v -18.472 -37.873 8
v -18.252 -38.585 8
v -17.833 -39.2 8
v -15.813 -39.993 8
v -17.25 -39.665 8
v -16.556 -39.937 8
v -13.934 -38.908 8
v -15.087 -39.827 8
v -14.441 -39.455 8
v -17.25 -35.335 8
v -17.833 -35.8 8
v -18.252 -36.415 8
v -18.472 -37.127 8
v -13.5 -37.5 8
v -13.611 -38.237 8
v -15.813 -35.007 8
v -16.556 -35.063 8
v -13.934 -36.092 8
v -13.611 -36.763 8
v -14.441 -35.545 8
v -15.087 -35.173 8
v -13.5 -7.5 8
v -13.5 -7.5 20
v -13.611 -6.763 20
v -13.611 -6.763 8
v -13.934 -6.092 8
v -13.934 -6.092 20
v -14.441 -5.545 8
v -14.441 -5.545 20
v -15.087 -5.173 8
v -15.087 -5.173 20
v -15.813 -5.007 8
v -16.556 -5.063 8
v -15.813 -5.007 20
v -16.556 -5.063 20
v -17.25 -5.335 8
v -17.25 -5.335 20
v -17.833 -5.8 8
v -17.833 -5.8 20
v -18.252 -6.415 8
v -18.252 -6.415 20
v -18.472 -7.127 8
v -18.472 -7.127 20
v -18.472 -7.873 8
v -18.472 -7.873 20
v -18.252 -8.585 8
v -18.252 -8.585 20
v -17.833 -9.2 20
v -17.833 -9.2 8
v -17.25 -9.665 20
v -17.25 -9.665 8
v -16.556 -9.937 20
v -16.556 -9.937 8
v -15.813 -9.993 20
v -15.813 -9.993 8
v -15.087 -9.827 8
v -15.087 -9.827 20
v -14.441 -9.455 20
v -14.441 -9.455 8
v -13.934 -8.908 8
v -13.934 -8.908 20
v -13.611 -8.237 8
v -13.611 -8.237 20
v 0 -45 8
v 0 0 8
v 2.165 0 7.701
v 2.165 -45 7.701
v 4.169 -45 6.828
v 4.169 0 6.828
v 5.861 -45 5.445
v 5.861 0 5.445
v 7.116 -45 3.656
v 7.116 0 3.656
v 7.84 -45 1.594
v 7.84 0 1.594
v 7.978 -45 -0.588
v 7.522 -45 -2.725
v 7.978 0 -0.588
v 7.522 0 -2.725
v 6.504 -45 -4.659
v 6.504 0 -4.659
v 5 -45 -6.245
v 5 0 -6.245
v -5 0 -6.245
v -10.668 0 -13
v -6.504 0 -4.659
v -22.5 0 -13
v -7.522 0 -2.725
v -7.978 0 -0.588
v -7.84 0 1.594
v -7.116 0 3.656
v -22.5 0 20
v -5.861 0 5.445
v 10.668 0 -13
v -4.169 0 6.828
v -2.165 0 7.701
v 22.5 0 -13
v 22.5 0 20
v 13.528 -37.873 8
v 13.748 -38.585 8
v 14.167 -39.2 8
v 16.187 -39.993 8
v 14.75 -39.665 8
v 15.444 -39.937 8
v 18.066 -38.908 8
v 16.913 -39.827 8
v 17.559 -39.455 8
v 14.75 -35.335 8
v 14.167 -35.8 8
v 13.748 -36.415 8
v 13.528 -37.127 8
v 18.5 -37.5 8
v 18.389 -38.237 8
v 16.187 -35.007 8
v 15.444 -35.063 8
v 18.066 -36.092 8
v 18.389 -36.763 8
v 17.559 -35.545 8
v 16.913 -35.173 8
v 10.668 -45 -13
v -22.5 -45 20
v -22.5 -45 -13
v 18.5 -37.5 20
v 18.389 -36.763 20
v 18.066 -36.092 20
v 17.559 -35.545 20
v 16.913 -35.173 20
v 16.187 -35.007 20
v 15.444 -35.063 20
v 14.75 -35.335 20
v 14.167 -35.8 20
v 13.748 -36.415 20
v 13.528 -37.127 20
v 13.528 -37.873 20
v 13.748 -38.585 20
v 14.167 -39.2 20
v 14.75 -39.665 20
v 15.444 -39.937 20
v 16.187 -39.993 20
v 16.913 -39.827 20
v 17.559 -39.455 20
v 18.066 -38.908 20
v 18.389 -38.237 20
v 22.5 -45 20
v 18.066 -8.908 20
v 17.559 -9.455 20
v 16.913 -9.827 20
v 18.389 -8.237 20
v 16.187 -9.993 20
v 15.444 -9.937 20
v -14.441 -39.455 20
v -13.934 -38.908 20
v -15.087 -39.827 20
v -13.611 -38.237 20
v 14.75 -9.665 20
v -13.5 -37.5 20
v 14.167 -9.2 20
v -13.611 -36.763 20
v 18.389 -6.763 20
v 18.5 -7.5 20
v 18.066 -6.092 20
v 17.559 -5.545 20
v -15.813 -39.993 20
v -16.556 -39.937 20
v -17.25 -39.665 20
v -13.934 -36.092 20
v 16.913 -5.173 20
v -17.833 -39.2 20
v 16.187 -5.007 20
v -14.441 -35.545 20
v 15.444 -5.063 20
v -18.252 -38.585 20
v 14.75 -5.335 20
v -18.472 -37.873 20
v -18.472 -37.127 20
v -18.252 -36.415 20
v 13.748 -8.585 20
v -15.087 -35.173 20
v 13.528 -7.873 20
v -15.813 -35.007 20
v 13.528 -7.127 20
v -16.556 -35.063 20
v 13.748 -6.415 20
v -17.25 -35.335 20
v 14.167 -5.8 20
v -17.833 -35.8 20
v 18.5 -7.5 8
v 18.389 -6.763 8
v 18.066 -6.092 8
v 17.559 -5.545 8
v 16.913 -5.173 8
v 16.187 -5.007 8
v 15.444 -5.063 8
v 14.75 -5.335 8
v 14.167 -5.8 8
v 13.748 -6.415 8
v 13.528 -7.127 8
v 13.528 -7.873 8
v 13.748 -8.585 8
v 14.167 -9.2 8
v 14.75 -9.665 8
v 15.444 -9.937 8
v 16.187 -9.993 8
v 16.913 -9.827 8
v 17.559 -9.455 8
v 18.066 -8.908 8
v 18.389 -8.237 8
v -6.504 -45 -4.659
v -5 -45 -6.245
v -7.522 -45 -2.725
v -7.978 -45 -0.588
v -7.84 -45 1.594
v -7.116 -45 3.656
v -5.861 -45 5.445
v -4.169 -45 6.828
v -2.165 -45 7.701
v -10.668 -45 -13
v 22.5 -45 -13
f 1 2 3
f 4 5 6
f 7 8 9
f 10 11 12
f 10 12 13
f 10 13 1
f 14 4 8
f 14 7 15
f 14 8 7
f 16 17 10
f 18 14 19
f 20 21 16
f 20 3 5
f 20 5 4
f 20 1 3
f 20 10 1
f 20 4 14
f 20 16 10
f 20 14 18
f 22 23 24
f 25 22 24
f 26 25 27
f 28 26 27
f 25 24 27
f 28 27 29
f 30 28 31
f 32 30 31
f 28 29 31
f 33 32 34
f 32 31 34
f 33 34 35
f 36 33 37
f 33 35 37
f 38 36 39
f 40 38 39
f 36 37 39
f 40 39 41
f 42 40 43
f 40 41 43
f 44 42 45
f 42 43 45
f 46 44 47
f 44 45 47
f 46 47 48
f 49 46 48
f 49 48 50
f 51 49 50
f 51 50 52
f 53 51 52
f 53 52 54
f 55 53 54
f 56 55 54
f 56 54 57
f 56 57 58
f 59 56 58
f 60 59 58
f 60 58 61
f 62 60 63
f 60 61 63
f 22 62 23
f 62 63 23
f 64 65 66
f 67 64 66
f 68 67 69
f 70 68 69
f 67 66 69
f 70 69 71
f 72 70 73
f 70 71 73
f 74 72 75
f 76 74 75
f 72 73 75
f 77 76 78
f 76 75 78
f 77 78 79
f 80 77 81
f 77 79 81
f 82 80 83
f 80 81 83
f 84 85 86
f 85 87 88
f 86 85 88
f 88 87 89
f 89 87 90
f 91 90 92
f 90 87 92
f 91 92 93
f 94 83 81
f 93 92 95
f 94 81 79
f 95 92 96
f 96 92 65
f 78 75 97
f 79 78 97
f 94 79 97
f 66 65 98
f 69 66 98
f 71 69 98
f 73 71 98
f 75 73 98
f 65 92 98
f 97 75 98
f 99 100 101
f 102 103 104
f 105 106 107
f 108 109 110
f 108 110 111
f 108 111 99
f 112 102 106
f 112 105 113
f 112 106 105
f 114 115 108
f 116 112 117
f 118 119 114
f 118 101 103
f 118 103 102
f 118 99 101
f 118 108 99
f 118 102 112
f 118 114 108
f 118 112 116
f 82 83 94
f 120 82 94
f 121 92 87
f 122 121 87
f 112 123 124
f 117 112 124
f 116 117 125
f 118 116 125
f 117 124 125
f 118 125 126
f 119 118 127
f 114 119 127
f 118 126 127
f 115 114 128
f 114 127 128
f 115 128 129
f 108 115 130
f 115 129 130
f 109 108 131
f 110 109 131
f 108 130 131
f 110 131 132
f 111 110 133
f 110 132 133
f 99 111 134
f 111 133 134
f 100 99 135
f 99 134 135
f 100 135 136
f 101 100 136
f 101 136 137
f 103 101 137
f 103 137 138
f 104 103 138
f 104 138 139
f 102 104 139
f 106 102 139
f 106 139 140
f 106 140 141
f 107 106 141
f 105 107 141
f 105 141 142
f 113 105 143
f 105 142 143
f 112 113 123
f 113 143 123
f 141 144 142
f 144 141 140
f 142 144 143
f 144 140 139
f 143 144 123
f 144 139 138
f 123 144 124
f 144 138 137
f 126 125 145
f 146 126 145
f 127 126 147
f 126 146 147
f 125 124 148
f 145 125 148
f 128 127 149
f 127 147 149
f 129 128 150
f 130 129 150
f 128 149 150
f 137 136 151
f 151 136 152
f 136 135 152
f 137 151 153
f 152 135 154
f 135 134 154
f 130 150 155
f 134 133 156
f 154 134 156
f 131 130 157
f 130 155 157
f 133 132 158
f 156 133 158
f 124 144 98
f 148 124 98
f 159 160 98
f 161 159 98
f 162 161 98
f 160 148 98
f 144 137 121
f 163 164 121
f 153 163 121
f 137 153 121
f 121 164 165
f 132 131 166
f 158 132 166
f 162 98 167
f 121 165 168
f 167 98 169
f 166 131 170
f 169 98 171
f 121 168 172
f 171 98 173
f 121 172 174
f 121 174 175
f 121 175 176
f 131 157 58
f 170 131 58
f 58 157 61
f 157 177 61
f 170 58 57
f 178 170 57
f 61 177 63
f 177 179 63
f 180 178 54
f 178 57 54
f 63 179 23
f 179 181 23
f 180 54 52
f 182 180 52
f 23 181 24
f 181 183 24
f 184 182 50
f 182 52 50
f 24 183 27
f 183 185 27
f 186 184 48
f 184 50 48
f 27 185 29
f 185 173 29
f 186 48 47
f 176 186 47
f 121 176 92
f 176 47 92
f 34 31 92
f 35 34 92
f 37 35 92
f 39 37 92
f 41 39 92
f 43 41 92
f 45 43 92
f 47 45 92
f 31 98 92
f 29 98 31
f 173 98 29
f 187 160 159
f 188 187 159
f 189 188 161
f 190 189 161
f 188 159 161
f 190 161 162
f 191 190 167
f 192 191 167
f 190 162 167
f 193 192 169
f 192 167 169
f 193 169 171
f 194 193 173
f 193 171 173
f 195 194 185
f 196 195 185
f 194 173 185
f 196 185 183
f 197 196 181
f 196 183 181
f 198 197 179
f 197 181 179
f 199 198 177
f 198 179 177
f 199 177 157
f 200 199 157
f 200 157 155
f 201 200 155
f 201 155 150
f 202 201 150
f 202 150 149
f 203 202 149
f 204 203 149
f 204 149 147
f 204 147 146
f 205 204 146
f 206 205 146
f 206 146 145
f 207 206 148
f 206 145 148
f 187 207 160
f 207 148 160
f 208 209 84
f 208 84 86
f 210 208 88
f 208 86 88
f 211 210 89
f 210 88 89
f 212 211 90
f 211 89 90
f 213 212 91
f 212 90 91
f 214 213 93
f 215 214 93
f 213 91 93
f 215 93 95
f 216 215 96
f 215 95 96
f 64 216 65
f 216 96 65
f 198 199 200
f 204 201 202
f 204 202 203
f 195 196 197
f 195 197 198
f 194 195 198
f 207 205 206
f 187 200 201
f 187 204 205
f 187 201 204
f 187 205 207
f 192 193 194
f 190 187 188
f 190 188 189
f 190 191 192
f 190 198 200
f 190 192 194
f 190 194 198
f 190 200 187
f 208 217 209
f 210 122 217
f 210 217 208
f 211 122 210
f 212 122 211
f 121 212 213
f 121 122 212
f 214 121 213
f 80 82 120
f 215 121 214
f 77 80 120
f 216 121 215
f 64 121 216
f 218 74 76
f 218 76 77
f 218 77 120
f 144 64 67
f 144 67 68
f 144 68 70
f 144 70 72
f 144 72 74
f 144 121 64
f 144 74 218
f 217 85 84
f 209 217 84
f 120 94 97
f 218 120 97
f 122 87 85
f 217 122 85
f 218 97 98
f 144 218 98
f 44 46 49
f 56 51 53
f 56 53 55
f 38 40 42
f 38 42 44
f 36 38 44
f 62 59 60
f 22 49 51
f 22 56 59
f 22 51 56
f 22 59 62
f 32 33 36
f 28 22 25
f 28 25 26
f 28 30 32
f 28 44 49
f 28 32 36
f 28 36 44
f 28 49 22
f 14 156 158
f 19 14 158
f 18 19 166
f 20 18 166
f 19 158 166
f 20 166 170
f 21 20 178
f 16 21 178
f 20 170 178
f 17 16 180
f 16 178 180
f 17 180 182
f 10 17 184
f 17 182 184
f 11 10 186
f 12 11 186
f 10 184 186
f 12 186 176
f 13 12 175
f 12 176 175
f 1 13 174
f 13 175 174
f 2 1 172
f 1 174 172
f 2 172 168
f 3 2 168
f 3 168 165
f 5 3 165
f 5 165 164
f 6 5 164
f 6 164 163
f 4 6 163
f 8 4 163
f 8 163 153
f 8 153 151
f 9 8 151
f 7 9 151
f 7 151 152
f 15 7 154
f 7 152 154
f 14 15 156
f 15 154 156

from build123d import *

# Parameters (mm, degrees)
F1_DEPTH = 45
F2_R     = 2.5
F3_DEPTH = 12


with BuildPart() as f1:
    # F0 (on Front) → F1 (new body)
    with BuildSketch(Plane.XZ):
        with BuildLine():
            Line((0, 20), (-22.5, 20))
            Line((-22.5, 20), (-22.5, -13))
            Line((-22.5, -13), (-10.66812, -13))
            Line((-10.66812, -13), (-5, -6.244998))
            ThreePointArc((-5, -6.244998), (-7.548509, 2.64953), (0, 8))
            Line((0, 8), (0, 20))
        make_face()
        with BuildLine():
            Line((22.5, 20), (0, 20))
            Line((0, 20), (0, 8))
            ThreePointArc((0, 8), (7.548509, 2.64953), (5, -6.244998))
            Line((5, -6.244998), (10.66812, -13))
            Line((10.66812, -13), (22.5, -13))
            Line((22.5, -13), (22.5, 20))
        make_face()
    extrude(amount=F1_DEPTH)

    # F2 (on face) → F3 (cut)
    with BuildSketch(Plane.XY.offset(20)):
        with Locations((-16, -7.5)):
            Circle(F2_R)
        with Locations((16, -7.5)):
            Circle(F2_R)
        with Locations((16, -37.5)):
            Circle(F2_R)
        with Locations((-16, -37.5)):
            Circle(F2_R)
    extrude(amount=-F3_DEPTH, mode=Mode.SUBTRACT)


solid = f1.part
